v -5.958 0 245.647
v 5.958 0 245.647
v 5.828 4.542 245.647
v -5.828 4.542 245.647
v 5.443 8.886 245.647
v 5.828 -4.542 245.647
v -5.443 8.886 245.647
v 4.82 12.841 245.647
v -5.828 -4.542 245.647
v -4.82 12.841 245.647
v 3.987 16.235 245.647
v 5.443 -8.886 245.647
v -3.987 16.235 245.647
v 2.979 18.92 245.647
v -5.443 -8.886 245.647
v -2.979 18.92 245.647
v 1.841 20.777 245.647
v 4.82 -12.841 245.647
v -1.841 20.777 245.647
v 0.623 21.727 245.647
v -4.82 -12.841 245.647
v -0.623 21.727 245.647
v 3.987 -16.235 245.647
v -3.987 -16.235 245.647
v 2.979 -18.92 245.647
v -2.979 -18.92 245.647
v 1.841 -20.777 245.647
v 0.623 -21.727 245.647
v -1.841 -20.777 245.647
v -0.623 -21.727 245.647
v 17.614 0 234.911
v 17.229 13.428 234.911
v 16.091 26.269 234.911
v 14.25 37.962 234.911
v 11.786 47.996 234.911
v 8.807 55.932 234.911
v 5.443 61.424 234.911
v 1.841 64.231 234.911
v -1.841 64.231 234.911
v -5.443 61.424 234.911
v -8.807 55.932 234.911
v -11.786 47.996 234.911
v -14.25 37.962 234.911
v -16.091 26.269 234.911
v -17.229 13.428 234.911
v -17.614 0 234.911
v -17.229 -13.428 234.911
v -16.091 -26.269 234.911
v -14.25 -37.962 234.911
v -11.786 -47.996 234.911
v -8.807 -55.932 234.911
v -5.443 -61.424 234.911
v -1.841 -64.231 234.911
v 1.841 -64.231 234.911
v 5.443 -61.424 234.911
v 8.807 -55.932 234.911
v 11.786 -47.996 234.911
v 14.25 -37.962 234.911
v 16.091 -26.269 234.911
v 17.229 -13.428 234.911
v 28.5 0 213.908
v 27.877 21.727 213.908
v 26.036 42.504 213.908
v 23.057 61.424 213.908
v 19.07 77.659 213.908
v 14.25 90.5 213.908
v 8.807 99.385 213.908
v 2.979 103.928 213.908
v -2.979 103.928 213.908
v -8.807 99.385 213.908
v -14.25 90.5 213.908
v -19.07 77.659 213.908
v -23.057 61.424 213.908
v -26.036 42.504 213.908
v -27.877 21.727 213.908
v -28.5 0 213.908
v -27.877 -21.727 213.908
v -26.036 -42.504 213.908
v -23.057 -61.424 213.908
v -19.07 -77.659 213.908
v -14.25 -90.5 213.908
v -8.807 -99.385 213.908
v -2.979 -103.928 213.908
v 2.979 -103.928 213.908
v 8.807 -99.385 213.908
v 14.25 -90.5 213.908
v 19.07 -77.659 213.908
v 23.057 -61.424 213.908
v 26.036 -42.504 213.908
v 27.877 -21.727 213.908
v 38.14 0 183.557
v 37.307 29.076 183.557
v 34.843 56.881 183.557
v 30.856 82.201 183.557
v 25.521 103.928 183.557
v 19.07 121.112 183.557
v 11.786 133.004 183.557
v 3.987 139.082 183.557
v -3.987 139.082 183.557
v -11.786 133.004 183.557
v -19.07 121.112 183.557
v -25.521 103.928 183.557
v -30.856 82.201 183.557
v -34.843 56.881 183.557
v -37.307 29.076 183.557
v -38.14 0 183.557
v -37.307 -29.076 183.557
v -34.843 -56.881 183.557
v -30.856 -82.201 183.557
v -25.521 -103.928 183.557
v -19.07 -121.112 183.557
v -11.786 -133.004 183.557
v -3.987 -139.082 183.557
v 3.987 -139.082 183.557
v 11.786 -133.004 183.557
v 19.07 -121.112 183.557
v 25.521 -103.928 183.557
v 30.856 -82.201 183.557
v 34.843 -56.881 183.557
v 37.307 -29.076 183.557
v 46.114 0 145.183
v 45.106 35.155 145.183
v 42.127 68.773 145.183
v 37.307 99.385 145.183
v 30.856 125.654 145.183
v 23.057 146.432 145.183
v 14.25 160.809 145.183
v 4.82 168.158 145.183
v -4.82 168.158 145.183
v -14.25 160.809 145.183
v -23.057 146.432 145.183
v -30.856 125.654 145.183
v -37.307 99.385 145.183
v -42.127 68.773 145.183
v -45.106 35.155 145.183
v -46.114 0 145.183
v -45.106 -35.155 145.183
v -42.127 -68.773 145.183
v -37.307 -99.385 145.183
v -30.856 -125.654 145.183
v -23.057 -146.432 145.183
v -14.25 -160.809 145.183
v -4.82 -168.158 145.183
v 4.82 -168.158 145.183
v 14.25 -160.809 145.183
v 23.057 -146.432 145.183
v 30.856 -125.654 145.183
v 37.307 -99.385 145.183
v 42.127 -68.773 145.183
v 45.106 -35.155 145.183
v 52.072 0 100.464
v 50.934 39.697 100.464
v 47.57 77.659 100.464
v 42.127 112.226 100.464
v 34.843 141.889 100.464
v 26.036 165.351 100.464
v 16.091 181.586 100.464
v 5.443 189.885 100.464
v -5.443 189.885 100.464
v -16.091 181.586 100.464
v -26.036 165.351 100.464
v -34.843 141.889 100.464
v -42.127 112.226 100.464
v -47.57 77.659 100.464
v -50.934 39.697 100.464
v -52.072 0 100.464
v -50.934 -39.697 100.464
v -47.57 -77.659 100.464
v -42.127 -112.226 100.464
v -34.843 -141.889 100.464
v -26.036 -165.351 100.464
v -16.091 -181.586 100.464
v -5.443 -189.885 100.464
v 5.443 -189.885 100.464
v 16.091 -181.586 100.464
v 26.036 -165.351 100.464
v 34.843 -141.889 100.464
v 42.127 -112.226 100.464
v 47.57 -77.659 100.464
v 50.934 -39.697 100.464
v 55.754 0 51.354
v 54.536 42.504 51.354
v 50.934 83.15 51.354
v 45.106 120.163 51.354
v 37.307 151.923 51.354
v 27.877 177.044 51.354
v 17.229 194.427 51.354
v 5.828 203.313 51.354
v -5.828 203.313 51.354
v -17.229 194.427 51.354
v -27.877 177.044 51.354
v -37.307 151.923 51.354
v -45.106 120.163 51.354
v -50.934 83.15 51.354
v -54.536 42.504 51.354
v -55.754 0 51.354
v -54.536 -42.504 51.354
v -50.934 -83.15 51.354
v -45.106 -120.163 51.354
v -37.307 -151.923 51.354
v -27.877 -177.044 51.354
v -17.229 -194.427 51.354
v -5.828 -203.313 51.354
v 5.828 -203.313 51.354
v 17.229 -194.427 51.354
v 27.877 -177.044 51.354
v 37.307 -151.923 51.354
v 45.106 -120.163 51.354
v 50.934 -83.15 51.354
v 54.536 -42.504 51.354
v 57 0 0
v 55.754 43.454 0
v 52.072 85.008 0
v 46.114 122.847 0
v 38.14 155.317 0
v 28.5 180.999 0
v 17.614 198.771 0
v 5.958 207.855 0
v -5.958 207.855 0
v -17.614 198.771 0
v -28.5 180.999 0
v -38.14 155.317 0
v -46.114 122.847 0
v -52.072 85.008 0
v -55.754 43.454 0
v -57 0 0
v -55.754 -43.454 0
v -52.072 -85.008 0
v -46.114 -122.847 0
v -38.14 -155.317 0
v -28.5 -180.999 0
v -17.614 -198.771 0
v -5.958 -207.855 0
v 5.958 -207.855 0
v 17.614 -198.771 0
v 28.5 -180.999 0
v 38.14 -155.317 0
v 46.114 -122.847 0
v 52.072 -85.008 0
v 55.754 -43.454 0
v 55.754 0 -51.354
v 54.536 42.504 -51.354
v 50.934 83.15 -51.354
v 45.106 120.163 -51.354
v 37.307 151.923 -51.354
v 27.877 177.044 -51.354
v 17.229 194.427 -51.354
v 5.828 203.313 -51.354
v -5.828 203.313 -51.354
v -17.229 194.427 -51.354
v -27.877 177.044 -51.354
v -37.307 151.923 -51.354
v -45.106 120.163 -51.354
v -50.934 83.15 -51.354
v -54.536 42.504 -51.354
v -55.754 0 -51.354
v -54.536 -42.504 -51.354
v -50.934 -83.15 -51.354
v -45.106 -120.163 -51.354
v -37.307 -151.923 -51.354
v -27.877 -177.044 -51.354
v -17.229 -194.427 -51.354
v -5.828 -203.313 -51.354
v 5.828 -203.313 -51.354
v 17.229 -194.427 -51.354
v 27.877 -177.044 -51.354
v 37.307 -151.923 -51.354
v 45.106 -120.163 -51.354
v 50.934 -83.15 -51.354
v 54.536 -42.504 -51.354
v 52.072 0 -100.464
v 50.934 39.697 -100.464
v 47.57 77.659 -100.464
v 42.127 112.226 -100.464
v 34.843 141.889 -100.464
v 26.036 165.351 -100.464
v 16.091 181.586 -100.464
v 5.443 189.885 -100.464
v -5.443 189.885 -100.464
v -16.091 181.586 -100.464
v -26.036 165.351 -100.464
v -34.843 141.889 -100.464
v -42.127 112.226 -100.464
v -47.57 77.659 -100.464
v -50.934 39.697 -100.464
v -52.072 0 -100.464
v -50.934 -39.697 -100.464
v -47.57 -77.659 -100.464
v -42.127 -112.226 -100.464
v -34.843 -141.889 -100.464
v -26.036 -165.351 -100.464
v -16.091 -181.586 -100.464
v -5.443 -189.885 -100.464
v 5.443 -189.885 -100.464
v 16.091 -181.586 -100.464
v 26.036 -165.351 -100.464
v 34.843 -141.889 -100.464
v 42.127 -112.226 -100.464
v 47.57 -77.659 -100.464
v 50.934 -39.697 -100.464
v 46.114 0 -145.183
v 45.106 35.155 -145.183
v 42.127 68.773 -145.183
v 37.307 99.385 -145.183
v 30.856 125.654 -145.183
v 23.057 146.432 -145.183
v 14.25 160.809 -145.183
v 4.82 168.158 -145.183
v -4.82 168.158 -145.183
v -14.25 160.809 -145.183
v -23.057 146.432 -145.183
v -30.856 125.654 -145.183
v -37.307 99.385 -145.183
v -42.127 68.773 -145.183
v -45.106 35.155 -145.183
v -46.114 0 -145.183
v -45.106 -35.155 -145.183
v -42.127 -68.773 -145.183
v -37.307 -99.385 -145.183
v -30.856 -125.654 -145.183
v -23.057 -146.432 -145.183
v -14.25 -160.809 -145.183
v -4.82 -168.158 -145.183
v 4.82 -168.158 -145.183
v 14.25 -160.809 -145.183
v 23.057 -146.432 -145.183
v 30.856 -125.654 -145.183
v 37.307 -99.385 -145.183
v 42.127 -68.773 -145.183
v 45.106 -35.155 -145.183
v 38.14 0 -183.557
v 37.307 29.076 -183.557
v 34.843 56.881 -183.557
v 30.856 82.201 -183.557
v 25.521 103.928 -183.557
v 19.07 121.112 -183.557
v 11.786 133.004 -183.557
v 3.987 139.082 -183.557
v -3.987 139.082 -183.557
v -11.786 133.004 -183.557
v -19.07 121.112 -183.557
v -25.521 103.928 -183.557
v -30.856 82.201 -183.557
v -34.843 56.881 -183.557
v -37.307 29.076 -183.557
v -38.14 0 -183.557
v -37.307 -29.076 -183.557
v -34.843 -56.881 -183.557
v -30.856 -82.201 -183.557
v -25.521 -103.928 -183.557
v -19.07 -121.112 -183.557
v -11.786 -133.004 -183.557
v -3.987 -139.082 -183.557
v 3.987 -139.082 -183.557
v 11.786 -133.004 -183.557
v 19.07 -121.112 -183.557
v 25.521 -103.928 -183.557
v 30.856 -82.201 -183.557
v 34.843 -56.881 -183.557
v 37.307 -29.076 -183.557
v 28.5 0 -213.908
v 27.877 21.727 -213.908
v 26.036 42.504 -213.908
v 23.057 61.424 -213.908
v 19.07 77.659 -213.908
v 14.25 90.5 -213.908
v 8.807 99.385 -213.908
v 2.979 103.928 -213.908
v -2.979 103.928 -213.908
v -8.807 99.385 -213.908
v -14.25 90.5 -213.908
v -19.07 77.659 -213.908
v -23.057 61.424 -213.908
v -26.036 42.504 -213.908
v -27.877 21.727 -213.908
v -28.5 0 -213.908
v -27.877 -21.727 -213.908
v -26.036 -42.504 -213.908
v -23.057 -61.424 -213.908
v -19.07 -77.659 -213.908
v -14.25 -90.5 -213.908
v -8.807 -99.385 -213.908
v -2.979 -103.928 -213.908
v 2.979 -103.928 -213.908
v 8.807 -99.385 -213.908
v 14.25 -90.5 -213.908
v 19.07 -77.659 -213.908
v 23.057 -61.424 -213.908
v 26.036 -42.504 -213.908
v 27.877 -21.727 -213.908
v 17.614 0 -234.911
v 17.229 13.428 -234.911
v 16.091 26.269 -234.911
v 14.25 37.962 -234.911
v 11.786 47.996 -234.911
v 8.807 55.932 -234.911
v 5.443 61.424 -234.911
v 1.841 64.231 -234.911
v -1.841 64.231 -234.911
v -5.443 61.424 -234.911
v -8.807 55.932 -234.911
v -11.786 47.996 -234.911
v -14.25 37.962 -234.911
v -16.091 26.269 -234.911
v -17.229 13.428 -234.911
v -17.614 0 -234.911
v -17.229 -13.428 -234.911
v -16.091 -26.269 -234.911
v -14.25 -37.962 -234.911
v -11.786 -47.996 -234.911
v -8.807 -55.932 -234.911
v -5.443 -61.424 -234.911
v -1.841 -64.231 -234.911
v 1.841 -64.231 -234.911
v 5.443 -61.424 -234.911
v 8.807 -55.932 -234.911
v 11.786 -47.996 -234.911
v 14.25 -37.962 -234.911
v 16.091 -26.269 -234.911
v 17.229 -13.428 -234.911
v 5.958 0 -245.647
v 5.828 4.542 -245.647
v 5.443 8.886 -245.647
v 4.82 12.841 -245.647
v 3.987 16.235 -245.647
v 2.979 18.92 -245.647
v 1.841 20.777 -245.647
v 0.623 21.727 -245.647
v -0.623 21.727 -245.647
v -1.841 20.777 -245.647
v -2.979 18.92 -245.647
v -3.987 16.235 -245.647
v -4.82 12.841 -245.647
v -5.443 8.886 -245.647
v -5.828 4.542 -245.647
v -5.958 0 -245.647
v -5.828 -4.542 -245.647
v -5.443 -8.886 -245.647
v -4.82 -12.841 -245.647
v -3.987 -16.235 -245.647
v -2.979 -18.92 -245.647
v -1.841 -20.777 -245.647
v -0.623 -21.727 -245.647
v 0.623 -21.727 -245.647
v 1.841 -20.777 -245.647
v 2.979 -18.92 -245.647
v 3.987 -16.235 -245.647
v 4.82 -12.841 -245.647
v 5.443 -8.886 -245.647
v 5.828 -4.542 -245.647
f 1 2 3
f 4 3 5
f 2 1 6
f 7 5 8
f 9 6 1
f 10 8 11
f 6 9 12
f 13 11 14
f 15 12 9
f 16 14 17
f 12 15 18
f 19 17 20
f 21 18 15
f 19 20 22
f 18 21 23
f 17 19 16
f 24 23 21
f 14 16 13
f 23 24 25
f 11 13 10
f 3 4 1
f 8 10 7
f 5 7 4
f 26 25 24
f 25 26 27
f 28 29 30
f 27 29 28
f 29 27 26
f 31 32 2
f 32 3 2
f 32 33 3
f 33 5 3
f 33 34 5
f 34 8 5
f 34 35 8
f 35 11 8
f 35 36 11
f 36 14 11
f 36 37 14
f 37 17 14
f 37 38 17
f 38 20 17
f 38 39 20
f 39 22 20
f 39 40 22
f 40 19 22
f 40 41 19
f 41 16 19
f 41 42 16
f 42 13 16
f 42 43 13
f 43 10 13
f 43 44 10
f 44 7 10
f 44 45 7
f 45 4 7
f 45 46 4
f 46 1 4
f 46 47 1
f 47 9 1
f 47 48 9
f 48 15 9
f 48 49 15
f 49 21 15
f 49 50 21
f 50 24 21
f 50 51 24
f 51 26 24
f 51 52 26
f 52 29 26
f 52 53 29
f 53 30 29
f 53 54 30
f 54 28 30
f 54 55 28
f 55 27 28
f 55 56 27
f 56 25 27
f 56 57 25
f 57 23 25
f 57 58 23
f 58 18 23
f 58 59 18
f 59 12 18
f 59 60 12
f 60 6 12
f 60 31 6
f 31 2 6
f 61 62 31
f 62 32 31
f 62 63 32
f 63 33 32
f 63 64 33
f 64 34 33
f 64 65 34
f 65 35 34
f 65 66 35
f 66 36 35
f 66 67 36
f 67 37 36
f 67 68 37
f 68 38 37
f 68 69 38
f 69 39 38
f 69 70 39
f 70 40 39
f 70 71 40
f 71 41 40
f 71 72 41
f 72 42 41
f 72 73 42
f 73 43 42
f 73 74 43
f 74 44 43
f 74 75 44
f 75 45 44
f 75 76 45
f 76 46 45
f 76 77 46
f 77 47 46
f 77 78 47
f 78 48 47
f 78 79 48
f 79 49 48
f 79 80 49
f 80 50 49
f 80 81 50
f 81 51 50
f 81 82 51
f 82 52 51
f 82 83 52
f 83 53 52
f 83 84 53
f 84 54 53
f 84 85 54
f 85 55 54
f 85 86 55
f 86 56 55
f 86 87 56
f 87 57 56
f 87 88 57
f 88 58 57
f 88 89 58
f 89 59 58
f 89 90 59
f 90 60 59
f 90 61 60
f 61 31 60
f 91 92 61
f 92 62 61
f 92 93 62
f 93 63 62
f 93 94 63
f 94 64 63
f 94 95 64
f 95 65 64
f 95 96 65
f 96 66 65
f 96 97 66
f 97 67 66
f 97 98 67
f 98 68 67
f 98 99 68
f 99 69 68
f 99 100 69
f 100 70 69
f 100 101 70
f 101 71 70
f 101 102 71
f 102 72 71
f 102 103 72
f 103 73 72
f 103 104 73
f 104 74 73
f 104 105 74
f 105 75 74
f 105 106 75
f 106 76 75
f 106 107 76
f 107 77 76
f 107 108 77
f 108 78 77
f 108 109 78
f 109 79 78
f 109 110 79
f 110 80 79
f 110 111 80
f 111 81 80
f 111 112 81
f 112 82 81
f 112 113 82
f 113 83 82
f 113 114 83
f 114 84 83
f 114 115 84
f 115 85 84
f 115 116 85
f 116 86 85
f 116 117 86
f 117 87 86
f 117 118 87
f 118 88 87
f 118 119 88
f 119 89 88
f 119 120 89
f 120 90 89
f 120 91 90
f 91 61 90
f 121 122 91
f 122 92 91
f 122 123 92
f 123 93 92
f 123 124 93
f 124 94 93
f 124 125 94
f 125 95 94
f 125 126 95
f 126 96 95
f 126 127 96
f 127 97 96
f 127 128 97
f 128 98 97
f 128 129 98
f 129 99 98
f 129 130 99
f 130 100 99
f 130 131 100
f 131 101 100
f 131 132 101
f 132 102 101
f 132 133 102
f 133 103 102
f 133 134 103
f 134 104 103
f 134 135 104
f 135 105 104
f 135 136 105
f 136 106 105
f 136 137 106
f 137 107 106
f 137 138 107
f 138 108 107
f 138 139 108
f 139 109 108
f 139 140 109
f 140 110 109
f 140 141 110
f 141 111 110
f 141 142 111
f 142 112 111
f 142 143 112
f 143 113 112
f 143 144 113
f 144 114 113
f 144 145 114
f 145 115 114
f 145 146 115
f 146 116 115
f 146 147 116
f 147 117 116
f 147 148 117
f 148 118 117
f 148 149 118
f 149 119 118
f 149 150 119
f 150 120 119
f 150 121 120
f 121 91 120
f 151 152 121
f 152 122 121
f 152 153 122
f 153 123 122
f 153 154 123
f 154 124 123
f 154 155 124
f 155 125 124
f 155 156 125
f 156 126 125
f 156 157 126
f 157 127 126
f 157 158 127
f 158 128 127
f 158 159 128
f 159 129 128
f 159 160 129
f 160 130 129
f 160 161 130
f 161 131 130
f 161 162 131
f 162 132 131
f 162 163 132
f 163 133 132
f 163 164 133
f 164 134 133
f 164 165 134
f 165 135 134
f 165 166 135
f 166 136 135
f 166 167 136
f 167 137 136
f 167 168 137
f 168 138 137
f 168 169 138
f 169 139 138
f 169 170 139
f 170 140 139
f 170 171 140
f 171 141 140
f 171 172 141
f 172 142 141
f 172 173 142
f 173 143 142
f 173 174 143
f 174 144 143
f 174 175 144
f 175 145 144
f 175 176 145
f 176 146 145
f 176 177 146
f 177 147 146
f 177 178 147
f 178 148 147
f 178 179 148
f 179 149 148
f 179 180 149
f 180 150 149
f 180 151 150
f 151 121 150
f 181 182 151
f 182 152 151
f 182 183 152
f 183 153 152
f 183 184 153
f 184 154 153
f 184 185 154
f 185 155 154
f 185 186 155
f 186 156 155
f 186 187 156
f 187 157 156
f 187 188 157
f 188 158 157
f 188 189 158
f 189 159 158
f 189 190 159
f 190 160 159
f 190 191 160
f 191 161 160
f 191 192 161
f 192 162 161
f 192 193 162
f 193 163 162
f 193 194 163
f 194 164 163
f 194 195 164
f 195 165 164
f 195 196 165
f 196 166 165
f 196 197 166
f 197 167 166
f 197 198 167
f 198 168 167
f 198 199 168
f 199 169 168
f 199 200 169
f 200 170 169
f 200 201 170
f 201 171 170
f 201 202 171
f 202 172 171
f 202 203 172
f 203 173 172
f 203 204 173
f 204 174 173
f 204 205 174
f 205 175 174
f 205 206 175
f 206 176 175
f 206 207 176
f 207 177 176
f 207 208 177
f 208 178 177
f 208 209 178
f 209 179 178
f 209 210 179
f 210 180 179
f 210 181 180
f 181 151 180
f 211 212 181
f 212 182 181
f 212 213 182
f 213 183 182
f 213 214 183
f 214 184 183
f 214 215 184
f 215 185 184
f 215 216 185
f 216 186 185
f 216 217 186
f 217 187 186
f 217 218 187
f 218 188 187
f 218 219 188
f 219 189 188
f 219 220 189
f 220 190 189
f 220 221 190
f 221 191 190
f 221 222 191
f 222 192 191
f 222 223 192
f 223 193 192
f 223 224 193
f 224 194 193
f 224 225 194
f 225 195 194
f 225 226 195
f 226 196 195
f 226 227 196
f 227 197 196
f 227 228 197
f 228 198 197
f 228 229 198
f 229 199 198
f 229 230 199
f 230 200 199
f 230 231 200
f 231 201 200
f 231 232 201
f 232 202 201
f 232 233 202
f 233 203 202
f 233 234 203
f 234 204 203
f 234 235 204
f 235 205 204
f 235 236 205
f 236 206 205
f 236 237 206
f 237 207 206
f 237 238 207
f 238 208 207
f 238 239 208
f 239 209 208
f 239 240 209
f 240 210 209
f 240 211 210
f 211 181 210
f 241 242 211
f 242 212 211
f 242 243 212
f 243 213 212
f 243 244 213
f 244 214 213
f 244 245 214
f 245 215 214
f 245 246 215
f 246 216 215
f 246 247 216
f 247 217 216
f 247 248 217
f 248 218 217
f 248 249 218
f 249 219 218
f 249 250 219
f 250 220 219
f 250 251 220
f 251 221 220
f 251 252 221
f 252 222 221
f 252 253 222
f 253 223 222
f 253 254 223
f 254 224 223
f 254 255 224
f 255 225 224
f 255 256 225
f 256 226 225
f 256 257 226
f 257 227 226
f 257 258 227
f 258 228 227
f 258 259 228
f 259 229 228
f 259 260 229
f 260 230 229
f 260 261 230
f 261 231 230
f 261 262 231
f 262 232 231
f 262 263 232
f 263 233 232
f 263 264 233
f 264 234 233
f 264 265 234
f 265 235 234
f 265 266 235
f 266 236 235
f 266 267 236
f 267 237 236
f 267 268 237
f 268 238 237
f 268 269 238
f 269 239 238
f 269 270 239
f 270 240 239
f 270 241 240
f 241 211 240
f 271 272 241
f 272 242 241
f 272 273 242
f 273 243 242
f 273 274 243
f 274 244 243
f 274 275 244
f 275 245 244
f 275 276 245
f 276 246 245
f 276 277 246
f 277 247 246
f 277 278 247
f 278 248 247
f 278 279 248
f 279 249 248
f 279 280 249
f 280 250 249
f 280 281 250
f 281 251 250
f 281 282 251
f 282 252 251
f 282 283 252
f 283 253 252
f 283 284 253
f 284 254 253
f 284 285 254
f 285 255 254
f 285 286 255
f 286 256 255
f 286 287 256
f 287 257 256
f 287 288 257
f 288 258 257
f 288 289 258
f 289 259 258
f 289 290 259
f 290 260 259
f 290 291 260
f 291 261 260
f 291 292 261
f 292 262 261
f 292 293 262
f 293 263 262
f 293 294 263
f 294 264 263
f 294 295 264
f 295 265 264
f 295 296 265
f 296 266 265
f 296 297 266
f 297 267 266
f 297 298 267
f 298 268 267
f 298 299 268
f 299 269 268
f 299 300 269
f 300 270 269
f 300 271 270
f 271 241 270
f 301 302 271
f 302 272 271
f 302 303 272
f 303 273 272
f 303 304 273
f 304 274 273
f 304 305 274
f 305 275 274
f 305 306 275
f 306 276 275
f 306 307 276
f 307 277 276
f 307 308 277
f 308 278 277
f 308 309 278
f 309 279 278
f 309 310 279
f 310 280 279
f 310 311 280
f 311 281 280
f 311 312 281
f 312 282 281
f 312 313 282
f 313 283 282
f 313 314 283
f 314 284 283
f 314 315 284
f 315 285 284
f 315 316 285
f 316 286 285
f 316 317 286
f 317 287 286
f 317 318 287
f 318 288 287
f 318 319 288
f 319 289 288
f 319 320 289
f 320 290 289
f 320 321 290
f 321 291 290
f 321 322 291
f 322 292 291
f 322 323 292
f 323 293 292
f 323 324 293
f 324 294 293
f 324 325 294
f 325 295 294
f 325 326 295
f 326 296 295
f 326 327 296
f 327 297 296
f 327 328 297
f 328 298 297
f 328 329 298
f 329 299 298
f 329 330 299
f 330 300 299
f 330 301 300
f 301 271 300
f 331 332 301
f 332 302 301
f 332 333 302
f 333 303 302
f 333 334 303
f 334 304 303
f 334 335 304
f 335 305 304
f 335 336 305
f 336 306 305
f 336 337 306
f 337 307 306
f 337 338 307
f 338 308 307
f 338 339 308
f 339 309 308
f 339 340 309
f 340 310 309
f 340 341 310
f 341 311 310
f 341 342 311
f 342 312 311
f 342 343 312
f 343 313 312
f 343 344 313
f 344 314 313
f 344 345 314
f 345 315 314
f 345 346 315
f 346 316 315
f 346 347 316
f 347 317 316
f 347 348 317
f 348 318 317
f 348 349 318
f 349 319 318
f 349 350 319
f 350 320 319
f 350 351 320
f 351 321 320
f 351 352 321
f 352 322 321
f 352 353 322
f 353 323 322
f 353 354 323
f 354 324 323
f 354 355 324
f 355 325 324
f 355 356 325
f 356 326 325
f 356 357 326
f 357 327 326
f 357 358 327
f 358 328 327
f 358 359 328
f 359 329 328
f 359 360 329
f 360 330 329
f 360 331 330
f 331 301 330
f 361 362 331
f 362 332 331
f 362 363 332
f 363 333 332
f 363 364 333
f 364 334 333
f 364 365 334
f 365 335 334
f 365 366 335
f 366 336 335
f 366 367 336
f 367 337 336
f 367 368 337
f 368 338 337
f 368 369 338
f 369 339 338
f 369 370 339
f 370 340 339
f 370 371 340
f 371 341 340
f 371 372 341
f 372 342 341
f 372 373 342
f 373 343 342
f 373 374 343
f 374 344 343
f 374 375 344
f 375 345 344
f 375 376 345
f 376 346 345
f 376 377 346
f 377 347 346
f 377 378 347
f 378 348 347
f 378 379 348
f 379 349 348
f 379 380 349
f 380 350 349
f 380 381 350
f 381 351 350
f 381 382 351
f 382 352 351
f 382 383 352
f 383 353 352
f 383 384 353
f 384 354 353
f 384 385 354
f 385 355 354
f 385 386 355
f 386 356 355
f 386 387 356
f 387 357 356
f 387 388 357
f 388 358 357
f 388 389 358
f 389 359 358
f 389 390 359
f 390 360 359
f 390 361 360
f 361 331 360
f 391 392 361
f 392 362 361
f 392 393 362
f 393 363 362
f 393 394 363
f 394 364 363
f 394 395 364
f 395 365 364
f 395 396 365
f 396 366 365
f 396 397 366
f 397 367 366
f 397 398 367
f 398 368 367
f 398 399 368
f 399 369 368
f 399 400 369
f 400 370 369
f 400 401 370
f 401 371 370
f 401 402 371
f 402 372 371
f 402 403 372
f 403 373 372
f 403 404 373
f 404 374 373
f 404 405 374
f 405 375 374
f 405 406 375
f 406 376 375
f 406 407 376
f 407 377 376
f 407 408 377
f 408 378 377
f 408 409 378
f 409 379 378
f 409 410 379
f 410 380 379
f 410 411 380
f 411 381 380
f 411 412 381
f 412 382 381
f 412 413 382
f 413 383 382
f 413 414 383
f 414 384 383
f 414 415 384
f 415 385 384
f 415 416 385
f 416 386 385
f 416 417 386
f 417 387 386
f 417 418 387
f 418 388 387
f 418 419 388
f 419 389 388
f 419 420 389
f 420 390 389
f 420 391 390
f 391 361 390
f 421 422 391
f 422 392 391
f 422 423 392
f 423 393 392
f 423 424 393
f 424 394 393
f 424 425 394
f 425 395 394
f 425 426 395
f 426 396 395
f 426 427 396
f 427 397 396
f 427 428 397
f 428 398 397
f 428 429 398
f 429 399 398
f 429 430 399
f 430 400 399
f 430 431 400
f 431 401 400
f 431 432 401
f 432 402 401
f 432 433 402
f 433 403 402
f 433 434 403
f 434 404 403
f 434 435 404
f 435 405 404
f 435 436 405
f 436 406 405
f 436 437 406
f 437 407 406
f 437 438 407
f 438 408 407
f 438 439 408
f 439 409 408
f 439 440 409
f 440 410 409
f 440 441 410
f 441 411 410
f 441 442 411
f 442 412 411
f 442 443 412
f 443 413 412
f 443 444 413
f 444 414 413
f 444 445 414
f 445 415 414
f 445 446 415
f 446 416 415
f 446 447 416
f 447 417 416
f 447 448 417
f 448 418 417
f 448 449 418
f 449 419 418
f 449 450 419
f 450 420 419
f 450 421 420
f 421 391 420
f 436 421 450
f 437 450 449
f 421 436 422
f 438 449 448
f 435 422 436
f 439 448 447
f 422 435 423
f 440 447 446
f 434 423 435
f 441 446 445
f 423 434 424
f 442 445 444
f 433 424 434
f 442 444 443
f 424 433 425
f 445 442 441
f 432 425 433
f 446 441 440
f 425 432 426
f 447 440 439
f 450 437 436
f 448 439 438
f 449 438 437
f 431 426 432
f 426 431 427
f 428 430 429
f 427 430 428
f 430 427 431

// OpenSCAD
// Generated by SolidPython 1.0.1 on 2020-07-29 00:39:25


scale(v = [3, 11, 13]) {
	sphere(r = 19);
}
/***********************************************
*********      SolidPython code:      **********
************************************************
 
# import packages: SolidPython
from solid import *
from solid.utils import *
from itertools import chain, combinations


class Resize:

    def __init__(self, scad_file):
        self.scad_file = scad_file
        #self.scad_file = import_scad(scad_file)
        # cone/cylinder param:
        self.r1 = 0
        self.r2 = 0
        self.h = 0
        # rectangular prism param:
        self.w = 0
        self.l = 0
        # ellipse param:
        self.r = 0

    # import OpenScad code (file name corresponds to shape)


    # classify shape + parameters
    def assign(self, param1, param2, param3):
        if self.scad_file == 'cone.scad':
            self.r1 = param1
            self.r2 = param2
            self.h = param3
        elif self.scad_file == 'cylinder.scad':
            self.r1 = param1
            self.r2 = param2
            self.h = param3
        elif self.scad_file == 'rectangularPrism.scad':
            self.h = param1
            self.l = param2
            self.w = param3
        else:
            self.r = param1
            self.h = param2

    # resize parameters
    def iterate(self):
        x = range(3, 20, 2)
        i = 1
        if self.scad_file == 'cone.scad':
            tempList = list(combinations(x, 2))
            for temp in tempList:
                param1 = temp[0]
                param2 = temp[1]
                filepath = 'produced_scad_files/' + 'cone' + str(param1) + '_' + str(param2) + '_' + '.scad'
                scad_render_to_file(cylinder(h=param1, r1=param2, r2=0), filepath)

        elif self.scad_file == 'cylinder.scad':
            tempList = list(combinations(x, 3))
            for temp in tempList:
                param1 = temp[0]
                param2 = temp[1]
                filepath = 'produced_scad_files/' + 'cylinder' + str(param1) + '_' + str(param2) + '_' + '.scad'
                scad_render_to_file(cylinder(h=param1, r1=param2, r2=param2), filepath)

        elif self.scad_file == 'rectangularPrism.scad':
            tempList = list(combinations(x, 3))
            for temp in tempList:
                param1 = temp[0]
                param2 = temp[1]
                param3 = temp[2]
                filepath = 'produced_scad_files/' + 'rectangularPrism' + str(param1) + '_' + str(param2) + '_' + str(
                    param3) + '.scad'
                scad_render_to_file(cube(size=(param1, param2, param3)), filepath)

        elif self.scad_file == 'ellipse.scad':
            tempList = list(combinations(x, 4))
            for temp in tempList:
                param1 = temp[0]
                param2 = temp[1]
                param3 = temp[2]
                param4 = temp[3]
                filepath = 'produced_scad_files/' + 'ellipse' + str(param1) + '_' + str(param2) + '_' + str(param3) + '_' + str(param4) + '.scad'
                scad_render_to_file(scale([param1, param2, param3])(sphere(r=param4)), filepath)

    def render_to_scadfile(self):
        scad_render_to_file(scad, 'example.scad') 
 
************************************************/
